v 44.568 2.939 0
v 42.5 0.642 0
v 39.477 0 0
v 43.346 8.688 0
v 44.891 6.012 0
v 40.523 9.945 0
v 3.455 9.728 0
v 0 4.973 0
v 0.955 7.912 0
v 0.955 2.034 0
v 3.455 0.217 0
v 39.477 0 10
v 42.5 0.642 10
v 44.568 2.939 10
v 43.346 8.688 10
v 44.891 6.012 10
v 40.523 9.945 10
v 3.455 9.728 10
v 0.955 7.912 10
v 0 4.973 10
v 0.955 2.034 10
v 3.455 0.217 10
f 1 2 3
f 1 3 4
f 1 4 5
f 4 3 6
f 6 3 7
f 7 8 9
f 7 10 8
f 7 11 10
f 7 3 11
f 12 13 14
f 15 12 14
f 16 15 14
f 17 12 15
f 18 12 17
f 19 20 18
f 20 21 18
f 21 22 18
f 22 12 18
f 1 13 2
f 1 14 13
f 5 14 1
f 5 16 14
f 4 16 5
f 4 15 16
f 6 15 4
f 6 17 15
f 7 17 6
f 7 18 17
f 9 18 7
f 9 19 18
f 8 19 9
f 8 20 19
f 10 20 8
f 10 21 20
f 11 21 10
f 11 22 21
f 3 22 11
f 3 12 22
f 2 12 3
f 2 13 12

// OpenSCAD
$fn = 32;

// ----------------------------------------------------------------------
// Lever arm: two bosses 10 and 10 mm, 35 mm between centres
// ----------------------------------------------------------------------

// --- parameters (mm) ---
profile_height = 10;      // extrusion height
profile_points = 11;      // points of the closed outline

profile = [[0, 4.973], [0.955, 2.034], [3.455, 0.217], [39.477, 0], [42.5, 0.642], [44.568, 2.939], [44.891, 6.012], [43.346, 8.688], [40.523, 9.945], [3.455, 9.728], [0.955, 7.912]];  // single closed polygon, 11 points, counter clockwise

// --- the one profile operation ---
linear_extrude(height = profile_height) polygon(points = profile);
